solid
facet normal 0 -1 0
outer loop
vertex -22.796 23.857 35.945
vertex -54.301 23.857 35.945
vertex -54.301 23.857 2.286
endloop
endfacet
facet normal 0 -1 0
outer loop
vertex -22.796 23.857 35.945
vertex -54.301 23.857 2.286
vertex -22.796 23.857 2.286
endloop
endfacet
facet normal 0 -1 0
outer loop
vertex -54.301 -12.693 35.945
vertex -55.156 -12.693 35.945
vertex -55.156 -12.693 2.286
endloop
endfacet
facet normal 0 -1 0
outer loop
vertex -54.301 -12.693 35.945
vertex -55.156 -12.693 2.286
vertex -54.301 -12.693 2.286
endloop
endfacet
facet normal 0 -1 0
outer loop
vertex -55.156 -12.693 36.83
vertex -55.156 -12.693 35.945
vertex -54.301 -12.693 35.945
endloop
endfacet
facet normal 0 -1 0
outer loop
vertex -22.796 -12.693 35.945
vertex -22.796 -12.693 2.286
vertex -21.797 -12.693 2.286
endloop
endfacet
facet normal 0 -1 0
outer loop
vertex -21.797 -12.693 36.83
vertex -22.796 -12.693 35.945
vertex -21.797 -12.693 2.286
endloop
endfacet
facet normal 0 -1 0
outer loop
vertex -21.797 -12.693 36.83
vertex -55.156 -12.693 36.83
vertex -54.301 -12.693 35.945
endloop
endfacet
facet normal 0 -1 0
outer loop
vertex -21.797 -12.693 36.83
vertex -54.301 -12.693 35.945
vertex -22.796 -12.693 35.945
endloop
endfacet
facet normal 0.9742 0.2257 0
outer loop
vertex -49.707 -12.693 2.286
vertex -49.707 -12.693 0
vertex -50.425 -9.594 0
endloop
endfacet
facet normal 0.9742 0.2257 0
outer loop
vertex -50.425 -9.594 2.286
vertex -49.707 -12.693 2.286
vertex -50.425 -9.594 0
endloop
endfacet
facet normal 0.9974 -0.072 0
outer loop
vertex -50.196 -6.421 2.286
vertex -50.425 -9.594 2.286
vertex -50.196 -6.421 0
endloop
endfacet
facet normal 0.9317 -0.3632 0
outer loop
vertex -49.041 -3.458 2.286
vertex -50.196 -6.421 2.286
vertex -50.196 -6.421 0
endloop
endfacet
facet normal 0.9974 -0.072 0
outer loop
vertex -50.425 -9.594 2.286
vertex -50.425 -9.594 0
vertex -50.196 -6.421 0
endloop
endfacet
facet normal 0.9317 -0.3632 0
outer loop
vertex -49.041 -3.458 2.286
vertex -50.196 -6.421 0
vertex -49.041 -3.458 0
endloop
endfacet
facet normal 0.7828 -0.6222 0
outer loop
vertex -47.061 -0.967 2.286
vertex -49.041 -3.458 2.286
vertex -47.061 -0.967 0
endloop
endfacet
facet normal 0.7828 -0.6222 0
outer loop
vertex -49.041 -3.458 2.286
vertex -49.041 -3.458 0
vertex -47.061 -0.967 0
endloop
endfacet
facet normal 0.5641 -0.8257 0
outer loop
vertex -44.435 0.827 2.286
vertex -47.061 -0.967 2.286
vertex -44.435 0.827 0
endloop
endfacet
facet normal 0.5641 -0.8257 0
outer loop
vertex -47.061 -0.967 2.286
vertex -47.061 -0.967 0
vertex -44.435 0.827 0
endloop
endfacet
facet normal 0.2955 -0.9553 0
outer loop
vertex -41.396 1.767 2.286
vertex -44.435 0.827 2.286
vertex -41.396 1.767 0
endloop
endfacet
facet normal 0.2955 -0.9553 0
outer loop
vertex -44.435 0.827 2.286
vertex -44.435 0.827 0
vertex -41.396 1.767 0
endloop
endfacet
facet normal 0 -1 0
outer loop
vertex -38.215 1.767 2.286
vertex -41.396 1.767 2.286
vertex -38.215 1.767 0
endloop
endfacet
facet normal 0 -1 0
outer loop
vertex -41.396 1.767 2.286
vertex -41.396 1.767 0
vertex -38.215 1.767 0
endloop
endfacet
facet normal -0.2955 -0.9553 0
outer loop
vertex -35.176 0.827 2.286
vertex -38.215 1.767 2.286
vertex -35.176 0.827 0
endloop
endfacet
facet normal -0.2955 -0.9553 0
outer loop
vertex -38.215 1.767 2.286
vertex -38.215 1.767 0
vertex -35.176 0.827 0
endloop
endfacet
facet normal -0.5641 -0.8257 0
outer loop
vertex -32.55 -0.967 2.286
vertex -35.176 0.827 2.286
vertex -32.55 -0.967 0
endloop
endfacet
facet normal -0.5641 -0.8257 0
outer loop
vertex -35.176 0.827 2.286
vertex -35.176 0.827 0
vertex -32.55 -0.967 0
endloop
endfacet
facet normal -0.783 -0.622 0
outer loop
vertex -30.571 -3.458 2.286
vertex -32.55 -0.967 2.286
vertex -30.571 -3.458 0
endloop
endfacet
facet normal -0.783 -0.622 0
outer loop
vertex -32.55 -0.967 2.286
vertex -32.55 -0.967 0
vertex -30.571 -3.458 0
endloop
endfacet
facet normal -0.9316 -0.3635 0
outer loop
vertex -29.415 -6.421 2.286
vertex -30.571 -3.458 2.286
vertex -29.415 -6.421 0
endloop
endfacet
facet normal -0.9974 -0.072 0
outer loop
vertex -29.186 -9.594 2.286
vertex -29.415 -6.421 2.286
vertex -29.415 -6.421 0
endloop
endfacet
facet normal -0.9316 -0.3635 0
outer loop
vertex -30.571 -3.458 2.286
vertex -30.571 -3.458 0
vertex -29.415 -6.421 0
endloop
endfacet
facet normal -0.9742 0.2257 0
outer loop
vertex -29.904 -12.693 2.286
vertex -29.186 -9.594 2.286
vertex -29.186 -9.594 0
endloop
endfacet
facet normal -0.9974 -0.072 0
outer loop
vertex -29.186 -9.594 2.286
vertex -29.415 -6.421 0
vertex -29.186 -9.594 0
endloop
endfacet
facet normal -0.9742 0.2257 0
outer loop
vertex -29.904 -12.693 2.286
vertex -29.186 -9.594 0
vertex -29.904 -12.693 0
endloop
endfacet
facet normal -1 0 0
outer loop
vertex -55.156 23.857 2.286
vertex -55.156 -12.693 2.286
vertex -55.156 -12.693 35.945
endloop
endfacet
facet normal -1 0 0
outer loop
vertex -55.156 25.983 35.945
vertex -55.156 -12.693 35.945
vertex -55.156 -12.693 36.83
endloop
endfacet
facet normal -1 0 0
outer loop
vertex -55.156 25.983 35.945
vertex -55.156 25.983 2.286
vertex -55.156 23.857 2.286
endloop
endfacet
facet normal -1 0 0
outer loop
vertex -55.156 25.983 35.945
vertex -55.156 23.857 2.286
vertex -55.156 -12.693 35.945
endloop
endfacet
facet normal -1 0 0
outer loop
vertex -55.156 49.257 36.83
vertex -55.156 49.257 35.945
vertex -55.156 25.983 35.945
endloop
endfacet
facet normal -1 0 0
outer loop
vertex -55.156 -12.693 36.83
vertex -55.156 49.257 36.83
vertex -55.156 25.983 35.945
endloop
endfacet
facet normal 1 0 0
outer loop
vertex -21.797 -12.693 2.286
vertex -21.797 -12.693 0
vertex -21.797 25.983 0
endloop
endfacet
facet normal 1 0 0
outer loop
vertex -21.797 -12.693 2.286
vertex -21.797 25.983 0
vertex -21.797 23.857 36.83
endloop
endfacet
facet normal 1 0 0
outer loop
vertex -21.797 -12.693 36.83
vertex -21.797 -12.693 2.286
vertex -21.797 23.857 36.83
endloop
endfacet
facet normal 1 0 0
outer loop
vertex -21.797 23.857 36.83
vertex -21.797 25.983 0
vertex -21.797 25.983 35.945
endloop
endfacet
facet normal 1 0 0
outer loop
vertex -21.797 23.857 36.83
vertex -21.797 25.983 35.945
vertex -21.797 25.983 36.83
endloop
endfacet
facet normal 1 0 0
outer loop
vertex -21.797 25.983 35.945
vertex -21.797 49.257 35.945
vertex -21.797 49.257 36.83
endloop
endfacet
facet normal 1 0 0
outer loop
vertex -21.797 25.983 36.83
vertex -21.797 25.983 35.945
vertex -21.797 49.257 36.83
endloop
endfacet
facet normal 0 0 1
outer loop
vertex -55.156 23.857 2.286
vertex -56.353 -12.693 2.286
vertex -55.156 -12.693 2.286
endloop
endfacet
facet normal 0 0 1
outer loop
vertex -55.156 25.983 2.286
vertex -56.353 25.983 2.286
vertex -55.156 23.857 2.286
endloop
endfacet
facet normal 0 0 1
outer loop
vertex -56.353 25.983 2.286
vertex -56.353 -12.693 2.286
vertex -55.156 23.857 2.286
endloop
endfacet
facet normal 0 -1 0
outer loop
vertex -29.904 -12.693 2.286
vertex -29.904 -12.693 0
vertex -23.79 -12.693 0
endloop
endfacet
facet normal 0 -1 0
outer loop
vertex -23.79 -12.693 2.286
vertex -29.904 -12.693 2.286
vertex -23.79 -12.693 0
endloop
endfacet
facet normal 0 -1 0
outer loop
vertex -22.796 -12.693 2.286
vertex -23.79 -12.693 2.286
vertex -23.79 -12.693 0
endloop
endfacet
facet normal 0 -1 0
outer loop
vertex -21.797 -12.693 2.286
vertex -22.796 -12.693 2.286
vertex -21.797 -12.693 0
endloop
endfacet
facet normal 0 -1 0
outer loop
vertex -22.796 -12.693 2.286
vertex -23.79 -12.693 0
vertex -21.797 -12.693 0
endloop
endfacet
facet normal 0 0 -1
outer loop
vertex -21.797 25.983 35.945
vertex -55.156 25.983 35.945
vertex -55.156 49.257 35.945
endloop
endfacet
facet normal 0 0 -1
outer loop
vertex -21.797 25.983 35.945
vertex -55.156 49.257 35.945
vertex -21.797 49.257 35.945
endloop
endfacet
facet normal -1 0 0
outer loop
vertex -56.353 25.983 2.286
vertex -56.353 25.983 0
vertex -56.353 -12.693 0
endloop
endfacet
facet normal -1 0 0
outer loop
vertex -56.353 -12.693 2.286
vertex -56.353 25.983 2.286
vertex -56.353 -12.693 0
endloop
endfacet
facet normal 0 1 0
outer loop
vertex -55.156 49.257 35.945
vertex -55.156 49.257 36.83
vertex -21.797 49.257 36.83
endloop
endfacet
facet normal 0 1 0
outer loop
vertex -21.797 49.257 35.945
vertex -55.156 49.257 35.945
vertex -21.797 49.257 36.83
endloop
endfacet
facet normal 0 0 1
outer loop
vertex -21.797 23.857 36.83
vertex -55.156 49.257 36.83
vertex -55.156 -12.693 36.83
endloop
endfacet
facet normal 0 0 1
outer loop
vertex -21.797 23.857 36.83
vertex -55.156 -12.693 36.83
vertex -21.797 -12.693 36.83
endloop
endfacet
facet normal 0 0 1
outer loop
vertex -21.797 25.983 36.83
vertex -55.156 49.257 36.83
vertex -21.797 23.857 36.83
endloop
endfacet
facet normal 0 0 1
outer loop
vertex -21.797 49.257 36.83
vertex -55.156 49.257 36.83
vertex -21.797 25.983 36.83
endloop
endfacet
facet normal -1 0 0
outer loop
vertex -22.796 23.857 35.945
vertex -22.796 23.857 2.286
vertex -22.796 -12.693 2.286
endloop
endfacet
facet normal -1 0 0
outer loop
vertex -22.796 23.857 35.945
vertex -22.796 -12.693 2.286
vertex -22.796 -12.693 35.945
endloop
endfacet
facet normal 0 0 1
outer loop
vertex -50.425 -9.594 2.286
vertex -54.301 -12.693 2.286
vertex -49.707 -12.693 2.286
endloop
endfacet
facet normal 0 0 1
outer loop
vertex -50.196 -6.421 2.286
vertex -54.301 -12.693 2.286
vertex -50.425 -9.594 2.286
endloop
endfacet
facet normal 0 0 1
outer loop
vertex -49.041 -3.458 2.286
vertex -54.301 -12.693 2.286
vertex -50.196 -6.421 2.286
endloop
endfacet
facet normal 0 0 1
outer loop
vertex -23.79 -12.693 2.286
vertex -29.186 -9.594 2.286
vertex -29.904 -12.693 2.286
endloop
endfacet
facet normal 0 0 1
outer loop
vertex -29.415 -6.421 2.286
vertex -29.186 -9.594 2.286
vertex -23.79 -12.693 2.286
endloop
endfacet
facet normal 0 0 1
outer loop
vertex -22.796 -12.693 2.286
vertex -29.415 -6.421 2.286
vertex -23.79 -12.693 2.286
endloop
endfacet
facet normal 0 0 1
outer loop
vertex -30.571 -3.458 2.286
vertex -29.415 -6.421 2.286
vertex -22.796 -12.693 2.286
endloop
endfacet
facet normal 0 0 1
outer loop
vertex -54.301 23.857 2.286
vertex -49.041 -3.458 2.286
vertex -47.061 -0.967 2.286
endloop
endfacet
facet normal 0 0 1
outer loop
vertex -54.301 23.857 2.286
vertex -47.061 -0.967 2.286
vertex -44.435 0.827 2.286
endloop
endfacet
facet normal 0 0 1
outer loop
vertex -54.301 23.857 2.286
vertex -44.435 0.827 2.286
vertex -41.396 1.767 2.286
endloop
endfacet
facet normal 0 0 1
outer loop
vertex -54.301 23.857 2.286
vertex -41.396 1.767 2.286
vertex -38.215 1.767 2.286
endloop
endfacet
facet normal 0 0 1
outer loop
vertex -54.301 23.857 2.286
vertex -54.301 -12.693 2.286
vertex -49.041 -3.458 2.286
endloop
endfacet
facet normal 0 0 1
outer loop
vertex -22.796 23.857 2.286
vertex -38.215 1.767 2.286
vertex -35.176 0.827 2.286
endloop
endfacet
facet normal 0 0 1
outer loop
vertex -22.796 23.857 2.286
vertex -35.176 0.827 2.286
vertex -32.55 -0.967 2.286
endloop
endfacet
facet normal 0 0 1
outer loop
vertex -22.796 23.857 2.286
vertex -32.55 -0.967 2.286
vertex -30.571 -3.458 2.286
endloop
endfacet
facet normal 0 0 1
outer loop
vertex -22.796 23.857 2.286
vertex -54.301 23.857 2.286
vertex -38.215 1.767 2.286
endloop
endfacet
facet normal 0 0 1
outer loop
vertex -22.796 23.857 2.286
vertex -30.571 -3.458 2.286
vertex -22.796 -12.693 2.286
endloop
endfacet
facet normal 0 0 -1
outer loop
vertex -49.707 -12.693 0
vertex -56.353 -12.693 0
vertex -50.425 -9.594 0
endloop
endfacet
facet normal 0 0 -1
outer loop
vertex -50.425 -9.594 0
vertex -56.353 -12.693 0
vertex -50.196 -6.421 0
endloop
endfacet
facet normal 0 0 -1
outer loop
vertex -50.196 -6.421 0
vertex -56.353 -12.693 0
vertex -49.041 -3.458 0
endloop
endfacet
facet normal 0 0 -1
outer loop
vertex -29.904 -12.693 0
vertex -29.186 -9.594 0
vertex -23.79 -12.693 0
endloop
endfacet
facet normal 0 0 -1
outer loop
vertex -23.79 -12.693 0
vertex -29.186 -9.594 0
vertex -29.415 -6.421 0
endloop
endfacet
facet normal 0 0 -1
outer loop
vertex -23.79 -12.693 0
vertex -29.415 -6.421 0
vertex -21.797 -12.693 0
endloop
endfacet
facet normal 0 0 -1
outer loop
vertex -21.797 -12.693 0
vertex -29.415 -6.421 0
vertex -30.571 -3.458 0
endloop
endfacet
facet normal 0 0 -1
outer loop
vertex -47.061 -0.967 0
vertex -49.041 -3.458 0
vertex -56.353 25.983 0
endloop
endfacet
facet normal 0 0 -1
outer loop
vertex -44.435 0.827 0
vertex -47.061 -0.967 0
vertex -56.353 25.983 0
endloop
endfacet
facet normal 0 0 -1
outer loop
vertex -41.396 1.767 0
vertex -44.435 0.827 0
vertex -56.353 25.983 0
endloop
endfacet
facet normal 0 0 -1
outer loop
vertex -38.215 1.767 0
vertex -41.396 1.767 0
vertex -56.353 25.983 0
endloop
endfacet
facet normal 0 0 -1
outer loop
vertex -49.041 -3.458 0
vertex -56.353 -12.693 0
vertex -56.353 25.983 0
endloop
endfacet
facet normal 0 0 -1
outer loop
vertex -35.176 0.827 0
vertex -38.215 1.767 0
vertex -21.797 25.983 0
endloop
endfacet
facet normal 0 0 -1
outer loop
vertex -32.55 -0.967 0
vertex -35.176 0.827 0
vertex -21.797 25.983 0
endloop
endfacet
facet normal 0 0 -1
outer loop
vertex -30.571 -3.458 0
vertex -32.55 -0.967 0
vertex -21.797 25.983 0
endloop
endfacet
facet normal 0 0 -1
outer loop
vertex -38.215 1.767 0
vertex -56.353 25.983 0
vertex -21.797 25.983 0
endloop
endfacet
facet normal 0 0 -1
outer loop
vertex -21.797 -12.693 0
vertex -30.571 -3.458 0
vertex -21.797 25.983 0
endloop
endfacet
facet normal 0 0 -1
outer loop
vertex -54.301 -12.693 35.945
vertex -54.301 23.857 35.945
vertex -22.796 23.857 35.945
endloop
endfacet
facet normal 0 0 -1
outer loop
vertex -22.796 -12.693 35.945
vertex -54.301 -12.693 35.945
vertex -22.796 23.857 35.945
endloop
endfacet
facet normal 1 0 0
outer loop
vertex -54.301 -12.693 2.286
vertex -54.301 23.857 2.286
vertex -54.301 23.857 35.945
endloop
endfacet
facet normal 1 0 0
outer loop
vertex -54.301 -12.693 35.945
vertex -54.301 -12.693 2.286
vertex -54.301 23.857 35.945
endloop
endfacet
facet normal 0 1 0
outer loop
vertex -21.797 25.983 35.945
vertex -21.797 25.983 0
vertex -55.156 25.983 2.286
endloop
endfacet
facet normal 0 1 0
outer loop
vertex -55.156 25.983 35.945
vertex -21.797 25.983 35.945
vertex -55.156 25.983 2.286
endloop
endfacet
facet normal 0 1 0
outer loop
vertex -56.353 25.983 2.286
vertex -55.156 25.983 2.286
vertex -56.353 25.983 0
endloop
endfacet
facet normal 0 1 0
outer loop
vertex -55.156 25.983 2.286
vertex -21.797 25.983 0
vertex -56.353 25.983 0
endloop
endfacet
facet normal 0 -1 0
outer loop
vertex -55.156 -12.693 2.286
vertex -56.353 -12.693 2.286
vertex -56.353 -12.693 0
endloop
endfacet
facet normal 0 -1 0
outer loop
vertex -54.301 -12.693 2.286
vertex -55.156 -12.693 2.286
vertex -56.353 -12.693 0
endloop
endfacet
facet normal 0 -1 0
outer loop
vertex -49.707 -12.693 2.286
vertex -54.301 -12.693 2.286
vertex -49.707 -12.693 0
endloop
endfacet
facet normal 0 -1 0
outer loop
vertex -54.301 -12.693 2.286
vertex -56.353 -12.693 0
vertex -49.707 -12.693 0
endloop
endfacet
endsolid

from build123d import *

# Parameters (mm, degrees)
F0_W          = 1.9936040044
F0_H          = 36.5494191647
F1_DEPTH      = 2.286
F2_DEPTH      = 36.83
F3_W          = 33.3596542478
F3_H          = 0.8849272299
F4_DEPTH      = 36.5494316
F4_DEPTH_BACK = 25.4
F5_W          = 0.8558779955
F5_H          = 33.6590727701
F6_DEPTH      = 36.5494316
F7_W          = 0.9992271662
F7_H          = 33.6590727701
F8_DEPTH      = 36.5494316


with BuildPart() as f1:
    # F0 (on Top) → F1 (new body)
    with BuildSketch(Plane.XY):
        Polygon((-55.1563985646, 25.9833149612), (-56.3525594771, 25.9833149612), (-56.3525594771, -12.6926153898), (-55.1563985646, -12.6926153898), (-55.1563985646, 23.8568037748), align=None)
        with Locations((-22.793546319, 5.5820941925)):
            Rectangle(F0_W, F0_H)
        Polygon((-21.7967443168, 25.9833149612), (-55.1563985646, 25.9833149612), (-55.1563985646, 23.8568037748), (-23.7903483212, 23.8568037748), (-21.7967443168, 23.8568037748), align=None)
        with BuildLine():
            Line((-23.7903483212, 23.8568037748), (-55.1563985646, 23.8568037748))
            Line((-55.1563985646, 23.8568037748), (-55.1563985646, -12.6926153898))
            Line((-55.1563985646, -12.6926153898), (-49.7072115541, -12.6926153898))
            ThreePointArc((-49.7072115541, -12.6926153898), (-39.8056404665, 1.8860553596), (-29.904069379, -12.6926153898))
            Line((-29.904069379, -12.6926153898), (-23.7903483212, -12.6926153898))
            Line((-23.7903483212, -12.6926153898), (-23.7903483212, 23.8568037748))
        make_face()
    extrude(amount=F1_DEPTH)

    # F0 (on Top) → F2 (join)
    with BuildSketch(Plane.XY):
        Polygon((-21.7967443168, 25.9833149612), (-55.1563985646, 25.9833149612), (-55.1563985646, 23.8568037748), (-23.7903483212, 23.8568037748), (-21.7967443168, 23.8568037748), align=None)
    extrude(amount=F2_DEPTH)

    # F3 (on face) → F4 (join, two sides)
    with BuildSketch(Plane.XZ.offset(-23.8568037748)) as f4_sk:
        with Locations((-38.4765714407, 36.3875363851)):
            Rectangle(F3_W, F3_H)
    extrude(amount=F4_DEPTH)
    extrude(f4_sk.sketch, amount=-F4_DEPTH_BACK)

    # F5 (on face) → F6 (join)
    with BuildSketch(Plane.XZ.offset(-23.8568037748)):
        with Locations((-54.7284595668, 19.1155363851)):
            Rectangle(F5_W, F5_H)
    extrude(amount=F6_DEPTH)

    # F7 (on face) → F8 (join)
    with BuildSketch(Plane.XZ.offset(-23.8568037748)):
        with Locations((-22.2963578999, 19.1155363851)):
            Rectangle(F7_W, F7_H)
    extrude(amount=F8_DEPTH)


solid = f1.part
